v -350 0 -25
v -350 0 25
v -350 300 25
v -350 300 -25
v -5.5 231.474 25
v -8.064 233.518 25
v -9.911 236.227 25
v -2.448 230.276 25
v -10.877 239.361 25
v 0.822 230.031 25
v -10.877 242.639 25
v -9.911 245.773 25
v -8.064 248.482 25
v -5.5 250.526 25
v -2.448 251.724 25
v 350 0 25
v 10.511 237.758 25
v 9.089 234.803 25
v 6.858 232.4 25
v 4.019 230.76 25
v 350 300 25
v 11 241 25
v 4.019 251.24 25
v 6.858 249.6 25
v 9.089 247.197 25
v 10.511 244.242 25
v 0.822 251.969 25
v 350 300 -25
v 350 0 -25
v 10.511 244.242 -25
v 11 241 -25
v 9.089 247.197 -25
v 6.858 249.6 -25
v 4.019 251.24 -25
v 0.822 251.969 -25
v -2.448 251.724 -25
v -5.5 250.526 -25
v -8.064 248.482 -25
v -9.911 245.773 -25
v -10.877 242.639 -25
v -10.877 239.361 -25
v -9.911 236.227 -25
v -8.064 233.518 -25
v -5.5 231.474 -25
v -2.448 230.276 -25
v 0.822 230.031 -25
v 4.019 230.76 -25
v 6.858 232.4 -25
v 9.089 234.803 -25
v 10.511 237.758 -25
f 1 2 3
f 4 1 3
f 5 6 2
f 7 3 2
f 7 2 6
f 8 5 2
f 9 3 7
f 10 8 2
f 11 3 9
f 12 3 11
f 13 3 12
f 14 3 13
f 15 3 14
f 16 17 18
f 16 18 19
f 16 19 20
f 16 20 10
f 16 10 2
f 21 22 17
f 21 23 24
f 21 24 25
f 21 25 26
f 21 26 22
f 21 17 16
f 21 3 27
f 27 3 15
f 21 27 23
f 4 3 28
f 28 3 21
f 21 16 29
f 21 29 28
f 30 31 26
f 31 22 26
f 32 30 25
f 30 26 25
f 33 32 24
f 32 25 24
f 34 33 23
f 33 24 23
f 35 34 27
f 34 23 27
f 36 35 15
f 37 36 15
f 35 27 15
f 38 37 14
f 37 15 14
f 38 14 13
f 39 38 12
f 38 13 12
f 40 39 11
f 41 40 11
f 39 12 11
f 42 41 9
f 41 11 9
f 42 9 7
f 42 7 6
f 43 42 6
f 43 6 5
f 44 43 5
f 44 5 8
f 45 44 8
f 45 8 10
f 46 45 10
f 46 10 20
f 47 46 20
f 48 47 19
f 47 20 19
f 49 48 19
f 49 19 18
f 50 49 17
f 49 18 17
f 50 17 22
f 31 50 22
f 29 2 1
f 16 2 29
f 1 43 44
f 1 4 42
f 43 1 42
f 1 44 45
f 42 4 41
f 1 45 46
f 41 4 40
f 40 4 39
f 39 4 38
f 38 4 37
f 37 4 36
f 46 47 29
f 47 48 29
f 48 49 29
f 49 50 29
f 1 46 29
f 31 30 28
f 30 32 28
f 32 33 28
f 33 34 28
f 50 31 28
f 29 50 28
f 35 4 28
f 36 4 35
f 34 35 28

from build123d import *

# Parameters (mm, degrees)
SKETCH1_W               = 700
SKETCH1_H               = 300
BOSS_EXTRUDE1_DEPTH     = 25
SKETCH2_R               = 11
CUT_EXTRUDE1_DEPTH      = 26
CUT_EXTRUDE1_DEPTH_BACK = 26


with BuildPart() as part:
    # Sketch1 → Boss-Extrude1 (new body, symmetric)
    with BuildSketch(Plane.XY):
        with Locations((0, 150)):
            Rectangle(SKETCH1_W, SKETCH1_H)
    extrude(amount=BOSS_EXTRUDE1_DEPTH, both=True)

    # Sketch2 → Cut-Extrude1 (cut, two sides)
    with BuildSketch(Plane.XY) as cut_extrude1_sk:
        with Locations((0, 241)):
            Circle(SKETCH2_R)
    extrude(amount=CUT_EXTRUDE1_DEPTH, mode=Mode.SUBTRACT)
    extrude(cut_extrude1_sk.sketch, amount=-CUT_EXTRUDE1_DEPTH_BACK, mode=Mode.SUBTRACT)


solid = part.part
